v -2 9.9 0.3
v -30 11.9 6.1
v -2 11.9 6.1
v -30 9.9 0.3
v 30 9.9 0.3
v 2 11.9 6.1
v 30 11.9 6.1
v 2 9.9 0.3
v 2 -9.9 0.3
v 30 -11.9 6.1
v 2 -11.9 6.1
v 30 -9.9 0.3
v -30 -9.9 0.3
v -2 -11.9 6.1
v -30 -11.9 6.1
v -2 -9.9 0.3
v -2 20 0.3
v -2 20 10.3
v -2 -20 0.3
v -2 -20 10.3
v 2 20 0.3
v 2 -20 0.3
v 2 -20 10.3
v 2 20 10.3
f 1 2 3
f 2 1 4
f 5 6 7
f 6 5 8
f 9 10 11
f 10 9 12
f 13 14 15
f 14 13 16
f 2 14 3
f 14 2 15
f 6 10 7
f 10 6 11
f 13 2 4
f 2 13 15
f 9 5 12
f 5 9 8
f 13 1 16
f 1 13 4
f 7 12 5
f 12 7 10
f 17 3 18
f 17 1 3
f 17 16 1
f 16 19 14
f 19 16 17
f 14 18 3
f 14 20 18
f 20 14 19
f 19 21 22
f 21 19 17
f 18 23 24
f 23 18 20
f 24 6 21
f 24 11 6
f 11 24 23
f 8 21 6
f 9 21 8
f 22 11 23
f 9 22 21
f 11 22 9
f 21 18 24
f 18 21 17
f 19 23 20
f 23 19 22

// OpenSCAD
// extender_len excludes chamfered attachments of 28+28mm
extender_len=4;
margin=0.1;

module extender() {
	translate([-(extender_len+56)/2, 0, -0.2]) rotate([90, 0, 90]) {
		linear_extrude(extender_len+56)
		  polygon(points=[[-12+margin, margin],[11.9, margin],[10-margin, 6-margin],[-10+margin, 6-margin]]);
	}
	translate([0, 0, 0.7]) cube([(extender_len+56)-2*28, 40, 10], center=true);
}

translate([0, 0, 6]) rotate([0, 180, 0]) extender();

// vim: ts=2:sw=2:noet:commentstring=//\ %s
